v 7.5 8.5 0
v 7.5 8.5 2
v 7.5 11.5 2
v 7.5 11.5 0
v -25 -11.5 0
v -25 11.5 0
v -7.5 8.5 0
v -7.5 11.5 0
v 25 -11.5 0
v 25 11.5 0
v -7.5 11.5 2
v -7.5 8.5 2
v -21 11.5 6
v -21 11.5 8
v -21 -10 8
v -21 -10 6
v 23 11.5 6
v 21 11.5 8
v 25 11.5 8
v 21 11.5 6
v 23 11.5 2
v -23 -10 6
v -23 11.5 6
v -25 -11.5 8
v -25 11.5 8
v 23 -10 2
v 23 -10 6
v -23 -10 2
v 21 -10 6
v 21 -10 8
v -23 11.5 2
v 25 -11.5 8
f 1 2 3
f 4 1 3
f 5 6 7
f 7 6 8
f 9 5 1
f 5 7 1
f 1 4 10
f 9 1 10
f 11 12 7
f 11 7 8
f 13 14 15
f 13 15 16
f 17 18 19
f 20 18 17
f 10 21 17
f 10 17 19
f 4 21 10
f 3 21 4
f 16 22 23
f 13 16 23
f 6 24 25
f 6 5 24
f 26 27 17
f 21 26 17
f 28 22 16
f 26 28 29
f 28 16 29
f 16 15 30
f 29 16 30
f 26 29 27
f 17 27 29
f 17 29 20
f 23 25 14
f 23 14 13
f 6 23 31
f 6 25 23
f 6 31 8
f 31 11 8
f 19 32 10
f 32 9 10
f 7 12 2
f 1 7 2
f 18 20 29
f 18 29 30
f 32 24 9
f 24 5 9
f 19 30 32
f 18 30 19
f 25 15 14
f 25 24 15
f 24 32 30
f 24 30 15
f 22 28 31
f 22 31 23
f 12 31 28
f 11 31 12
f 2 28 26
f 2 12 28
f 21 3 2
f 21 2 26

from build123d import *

# Parameters (mm, degrees)
SKETCH1_W           = 50
SKETCH1_H           = 23
BOSS_EXTRUDE1_DEPTH = 2
SKETCH2_W           = 50
SKETCH2_H           = 23
BOSS_EXTRUDE2_DEPTH = 6
SKETCH3_W           = 46
SKETCH3_H           = 20
CUT_EXTRUDE1_DEPTH  = 4
SKETCH4_W           = 46
SKETCH4_H           = 4
CUT_EXTRUDE2_DEPTH  = 4
SKETCH5_W           = 46
SKETCH5_H           = 21.5
CUT_EXTRUDE3_DEPTH  = 2
SKETCH6_W           = 2
SKETCH6_H           = 21.5
BOSS_EXTRUDE3_DEPTH = 2
SKETCH7_W           = 2
SKETCH7_H           = 21.5
BOSS_EXTRUDE4_DEPTH = 2
SKETCH8_W           = 15
SKETCH8_H           = 6
CUT_EXTRUDE5_DEPTH  = 2


with BuildPart() as part:
    # Sketch1 → Boss-Extrude1 (new body)
    with BuildSketch(Plane.XY):
        Rectangle(SKETCH1_W, SKETCH1_H)
    extrude(amount=BOSS_EXTRUDE1_DEPTH)

    # Sketch2 → Boss-Extrude2 (add)
    with BuildSketch(Plane.XY.offset(2)):
        Rectangle(SKETCH2_W, SKETCH2_H)
    extrude(amount=BOSS_EXTRUDE2_DEPTH)

    # Sketch3 → Cut-Extrude1 (cut)
    with BuildSketch(Plane.XY.offset(8)):
        Rectangle(SKETCH3_W, SKETCH3_H)
    extrude(amount=-CUT_EXTRUDE1_DEPTH, mode=Mode.SUBTRACT)

    # Sketch4 → Cut-Extrude2 (cut)
    with BuildSketch(Plane.XZ.offset(-10)):
        with Locations((0, 6)):
            Rectangle(SKETCH4_W, SKETCH4_H)
    extrude(amount=-CUT_EXTRUDE2_DEPTH, mode=Mode.SUBTRACT)

    # Sketch5 → Cut-Extrude3 (cut)
    with BuildSketch(Plane.XY.offset(4)):
        with Locations((0, 0.75)):
            Rectangle(SKETCH5_W, SKETCH5_H)
    extrude(amount=-CUT_EXTRUDE3_DEPTH, mode=Mode.SUBTRACT)

    # Sketch6 → Boss-Extrude3 (add)
    with BuildSketch(Plane.ZY.offset(-23)):
        with Locations((7, 0.75)):
            Rectangle(SKETCH6_W, SKETCH6_H)
    extrude(amount=BOSS_EXTRUDE3_DEPTH)

    # Sketch7 → Boss-Extrude4 (add)
    with BuildSketch(Plane(origin=(-23, 0, 0), x_dir=(0, 0, -1), z_dir=(1, 0, 0))):
        with Locations((-7, 0.75)):
            Rectangle(SKETCH7_W, SKETCH7_H)
    extrude(amount=BOSS_EXTRUDE4_DEPTH)

    # Sketch8 → Cut-Extrude5 (cut)
    with BuildSketch(Plane.XY.offset(2)):
        with Locations((0, 11.5)):
            Rectangle(SKETCH8_W, SKETCH8_H)
    extrude(amount=-CUT_EXTRUDE5_DEPTH, mode=Mode.SUBTRACT)


solid = part.part
